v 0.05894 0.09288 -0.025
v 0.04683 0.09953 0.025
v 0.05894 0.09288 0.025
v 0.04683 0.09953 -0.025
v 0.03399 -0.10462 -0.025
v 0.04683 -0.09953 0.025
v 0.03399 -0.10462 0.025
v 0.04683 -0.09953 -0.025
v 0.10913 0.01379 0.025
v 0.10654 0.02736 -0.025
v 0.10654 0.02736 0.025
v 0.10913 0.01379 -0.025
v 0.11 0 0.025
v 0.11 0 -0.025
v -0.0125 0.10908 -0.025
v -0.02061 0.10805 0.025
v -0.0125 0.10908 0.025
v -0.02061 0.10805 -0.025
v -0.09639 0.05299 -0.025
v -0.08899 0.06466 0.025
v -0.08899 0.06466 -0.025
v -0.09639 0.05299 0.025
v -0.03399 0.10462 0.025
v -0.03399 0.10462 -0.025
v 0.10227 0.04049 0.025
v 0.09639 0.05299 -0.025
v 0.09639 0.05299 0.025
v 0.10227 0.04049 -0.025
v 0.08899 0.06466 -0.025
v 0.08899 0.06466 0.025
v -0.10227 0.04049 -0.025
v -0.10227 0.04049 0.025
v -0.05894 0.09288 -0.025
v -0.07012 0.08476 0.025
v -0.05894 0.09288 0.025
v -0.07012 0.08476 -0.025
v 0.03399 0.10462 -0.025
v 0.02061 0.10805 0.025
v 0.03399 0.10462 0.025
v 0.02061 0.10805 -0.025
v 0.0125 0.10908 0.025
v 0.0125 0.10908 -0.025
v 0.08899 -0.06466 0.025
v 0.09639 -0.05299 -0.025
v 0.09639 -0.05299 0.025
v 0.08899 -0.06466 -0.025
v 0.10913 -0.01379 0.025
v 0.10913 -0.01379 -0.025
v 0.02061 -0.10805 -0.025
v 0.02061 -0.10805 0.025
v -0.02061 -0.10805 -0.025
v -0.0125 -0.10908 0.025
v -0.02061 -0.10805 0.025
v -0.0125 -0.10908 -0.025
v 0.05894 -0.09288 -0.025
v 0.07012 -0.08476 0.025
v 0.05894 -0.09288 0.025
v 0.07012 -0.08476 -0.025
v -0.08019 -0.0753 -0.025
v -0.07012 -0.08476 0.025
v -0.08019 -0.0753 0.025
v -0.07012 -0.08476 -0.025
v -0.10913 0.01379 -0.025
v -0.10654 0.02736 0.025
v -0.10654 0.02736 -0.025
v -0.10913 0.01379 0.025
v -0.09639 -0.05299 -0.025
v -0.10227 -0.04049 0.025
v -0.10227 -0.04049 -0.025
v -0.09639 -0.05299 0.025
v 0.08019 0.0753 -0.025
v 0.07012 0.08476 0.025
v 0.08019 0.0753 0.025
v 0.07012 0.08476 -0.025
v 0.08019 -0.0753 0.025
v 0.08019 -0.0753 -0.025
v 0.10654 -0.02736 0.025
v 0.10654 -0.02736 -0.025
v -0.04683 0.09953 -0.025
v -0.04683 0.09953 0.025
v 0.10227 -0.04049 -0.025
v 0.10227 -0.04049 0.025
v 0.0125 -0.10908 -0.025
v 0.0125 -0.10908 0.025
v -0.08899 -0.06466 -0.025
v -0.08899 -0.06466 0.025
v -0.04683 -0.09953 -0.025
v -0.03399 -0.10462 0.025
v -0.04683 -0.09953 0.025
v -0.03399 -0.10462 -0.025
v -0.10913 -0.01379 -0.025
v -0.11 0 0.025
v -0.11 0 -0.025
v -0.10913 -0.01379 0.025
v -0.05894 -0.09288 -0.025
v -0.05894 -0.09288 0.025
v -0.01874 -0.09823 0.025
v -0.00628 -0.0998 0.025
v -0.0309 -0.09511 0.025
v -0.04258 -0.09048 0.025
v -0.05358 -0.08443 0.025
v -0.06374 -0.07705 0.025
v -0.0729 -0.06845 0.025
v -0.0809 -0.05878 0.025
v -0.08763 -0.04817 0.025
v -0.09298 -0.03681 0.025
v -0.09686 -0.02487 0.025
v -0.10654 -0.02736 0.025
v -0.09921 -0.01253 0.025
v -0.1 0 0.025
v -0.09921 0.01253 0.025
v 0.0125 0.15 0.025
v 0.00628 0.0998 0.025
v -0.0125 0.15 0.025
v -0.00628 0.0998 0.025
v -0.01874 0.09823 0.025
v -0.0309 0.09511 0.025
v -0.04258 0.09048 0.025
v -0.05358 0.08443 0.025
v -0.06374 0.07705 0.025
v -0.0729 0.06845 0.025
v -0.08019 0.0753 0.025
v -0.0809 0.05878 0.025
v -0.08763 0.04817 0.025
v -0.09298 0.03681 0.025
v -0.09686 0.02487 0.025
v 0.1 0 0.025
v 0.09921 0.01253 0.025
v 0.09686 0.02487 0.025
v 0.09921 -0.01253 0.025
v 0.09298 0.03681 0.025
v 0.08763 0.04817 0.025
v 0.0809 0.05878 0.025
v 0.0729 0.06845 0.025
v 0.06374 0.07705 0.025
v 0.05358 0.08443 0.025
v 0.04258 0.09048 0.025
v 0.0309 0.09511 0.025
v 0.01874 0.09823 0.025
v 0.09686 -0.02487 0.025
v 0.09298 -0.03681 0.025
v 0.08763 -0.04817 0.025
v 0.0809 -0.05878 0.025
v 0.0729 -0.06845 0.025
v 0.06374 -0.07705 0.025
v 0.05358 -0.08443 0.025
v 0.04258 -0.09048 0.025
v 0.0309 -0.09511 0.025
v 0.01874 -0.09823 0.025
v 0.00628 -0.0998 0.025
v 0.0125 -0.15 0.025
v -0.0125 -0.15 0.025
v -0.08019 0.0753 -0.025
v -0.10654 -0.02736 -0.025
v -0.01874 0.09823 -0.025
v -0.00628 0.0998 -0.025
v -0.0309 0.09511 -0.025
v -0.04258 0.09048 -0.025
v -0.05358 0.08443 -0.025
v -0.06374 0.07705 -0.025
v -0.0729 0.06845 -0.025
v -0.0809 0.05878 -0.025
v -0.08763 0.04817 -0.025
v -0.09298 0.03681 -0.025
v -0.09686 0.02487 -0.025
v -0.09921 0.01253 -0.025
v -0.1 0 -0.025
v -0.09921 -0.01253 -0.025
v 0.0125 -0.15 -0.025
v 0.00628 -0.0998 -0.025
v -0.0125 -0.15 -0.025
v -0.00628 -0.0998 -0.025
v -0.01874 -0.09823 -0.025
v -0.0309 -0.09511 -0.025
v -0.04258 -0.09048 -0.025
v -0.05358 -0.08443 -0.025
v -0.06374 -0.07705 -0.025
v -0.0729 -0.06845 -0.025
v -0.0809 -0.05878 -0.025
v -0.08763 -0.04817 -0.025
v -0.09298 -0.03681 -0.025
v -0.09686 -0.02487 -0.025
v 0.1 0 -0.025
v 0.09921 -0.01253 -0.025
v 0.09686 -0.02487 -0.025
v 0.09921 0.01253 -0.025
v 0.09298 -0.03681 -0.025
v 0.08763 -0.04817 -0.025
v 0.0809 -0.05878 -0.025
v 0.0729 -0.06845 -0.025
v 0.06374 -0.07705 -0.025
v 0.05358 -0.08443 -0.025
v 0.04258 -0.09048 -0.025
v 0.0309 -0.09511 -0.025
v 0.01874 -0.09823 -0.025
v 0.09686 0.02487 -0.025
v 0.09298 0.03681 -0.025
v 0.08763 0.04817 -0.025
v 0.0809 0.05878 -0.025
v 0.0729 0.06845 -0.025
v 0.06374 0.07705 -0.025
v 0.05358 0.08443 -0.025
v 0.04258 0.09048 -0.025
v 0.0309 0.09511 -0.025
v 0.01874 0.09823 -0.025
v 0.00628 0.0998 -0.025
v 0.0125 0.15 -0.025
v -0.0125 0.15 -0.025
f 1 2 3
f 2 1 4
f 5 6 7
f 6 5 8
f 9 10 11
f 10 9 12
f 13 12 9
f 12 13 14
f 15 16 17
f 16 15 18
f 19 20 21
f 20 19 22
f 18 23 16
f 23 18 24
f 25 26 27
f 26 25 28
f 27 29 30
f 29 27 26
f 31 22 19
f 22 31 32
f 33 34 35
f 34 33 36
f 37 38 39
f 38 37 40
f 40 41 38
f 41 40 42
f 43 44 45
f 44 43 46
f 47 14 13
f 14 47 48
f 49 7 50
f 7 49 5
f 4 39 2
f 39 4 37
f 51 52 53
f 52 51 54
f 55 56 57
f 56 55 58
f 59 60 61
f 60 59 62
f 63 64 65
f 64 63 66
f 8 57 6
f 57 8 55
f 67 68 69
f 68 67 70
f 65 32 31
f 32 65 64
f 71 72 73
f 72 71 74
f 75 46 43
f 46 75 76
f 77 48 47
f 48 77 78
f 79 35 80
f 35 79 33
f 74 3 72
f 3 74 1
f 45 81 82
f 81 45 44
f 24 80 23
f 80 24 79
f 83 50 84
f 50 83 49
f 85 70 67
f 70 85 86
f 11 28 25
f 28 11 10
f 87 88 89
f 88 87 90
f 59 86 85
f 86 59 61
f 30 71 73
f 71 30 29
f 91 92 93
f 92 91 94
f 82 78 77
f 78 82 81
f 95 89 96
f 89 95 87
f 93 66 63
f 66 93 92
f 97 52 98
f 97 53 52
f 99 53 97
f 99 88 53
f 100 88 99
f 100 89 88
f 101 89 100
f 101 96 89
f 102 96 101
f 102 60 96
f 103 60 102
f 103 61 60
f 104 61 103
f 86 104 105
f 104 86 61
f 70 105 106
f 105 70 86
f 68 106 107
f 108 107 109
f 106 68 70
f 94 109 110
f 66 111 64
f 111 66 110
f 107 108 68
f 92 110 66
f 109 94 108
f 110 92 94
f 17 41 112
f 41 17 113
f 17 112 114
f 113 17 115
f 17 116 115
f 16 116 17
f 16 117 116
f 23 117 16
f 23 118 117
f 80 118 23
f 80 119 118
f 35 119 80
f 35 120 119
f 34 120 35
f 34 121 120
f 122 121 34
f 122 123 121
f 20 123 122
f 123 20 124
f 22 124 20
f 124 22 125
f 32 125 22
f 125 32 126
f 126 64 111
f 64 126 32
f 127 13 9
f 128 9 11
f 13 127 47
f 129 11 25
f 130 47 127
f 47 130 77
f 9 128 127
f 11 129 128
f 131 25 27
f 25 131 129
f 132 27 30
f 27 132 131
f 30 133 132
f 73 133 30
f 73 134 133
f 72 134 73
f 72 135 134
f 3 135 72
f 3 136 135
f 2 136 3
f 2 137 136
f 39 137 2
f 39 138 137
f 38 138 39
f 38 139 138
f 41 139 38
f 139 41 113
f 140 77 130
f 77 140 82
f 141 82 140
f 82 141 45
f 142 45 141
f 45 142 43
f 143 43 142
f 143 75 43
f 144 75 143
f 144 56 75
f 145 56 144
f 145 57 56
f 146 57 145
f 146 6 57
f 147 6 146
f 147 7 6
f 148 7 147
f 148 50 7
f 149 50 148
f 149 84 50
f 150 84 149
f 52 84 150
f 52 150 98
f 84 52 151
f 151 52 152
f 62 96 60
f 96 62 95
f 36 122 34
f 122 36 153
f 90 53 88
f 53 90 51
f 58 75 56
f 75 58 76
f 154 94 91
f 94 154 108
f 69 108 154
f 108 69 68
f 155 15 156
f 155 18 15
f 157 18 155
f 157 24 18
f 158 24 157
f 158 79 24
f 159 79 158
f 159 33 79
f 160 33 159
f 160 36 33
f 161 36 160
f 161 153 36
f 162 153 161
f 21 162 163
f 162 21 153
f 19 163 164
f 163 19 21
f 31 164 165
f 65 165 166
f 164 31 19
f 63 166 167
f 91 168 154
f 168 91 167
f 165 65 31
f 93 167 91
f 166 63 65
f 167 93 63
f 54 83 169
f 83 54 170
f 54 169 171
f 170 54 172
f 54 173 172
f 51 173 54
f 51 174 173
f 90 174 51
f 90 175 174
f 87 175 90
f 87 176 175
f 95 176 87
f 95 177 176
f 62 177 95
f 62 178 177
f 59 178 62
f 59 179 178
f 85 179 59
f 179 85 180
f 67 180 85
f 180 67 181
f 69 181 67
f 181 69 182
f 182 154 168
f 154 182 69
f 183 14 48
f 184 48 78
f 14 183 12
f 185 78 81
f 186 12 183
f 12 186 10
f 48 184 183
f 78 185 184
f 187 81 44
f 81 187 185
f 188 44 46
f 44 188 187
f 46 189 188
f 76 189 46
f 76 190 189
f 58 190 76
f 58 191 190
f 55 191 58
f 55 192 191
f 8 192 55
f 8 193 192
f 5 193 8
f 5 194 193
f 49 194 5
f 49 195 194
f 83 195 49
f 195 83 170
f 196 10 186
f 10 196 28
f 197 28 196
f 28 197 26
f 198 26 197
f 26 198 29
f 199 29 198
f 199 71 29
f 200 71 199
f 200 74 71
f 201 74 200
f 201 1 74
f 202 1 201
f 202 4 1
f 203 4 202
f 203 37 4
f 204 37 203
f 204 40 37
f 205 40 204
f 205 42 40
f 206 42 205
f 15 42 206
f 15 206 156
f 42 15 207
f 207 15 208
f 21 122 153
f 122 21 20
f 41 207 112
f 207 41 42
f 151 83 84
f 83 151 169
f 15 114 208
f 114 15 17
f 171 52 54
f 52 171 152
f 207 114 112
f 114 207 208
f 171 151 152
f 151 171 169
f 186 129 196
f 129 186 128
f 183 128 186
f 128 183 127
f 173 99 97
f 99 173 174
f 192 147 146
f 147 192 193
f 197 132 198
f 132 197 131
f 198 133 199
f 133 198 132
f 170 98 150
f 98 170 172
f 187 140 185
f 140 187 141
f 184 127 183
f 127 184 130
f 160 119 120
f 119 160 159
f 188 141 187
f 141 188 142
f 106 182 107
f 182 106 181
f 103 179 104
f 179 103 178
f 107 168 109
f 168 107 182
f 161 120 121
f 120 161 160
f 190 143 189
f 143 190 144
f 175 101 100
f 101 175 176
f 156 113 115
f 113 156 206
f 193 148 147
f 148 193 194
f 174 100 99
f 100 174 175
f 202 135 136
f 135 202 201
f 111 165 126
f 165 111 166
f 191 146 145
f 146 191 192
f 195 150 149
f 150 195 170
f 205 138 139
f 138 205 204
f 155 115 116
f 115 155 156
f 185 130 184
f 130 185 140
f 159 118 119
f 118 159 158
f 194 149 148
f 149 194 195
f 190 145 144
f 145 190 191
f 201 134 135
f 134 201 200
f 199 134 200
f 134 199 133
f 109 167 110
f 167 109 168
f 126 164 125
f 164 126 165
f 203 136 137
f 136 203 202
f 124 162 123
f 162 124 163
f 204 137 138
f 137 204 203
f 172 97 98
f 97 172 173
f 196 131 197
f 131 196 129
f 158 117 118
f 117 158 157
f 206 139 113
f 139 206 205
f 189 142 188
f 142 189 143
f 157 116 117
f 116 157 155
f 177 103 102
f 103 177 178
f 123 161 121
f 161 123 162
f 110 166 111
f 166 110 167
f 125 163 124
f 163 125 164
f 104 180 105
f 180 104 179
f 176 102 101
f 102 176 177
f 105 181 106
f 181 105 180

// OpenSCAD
$fn=50;  // REMOVE
LENGTH = 0.1;  // REMOVE
C1_DO = 0.2; // REMOVE
C1_ANGLE_VERTICAL = 90; // REMOVE
C1_ANGLE_AZIMUTHAL = 0; // REMOVE
C1_ANGLE_AXIS = 0; // REMOVE

rotate([0,-1*(C1_ANGLE_VERTICAL),-1*(C1_ANGLE_AZIMUTHAL)])
rotate([0,90,0]) difference(){
   union(){cylinder(h=0.25*(C1_DO), r=(C1_DO)*1.1/2, center=true); cube([0.125*(C1_DO),1.5*(C1_DO),0.25*(C1_DO)],center=true);}
   cylinder(h=0.3*(C1_DO), r=(C1_DO)/2, center=true);
}
   
